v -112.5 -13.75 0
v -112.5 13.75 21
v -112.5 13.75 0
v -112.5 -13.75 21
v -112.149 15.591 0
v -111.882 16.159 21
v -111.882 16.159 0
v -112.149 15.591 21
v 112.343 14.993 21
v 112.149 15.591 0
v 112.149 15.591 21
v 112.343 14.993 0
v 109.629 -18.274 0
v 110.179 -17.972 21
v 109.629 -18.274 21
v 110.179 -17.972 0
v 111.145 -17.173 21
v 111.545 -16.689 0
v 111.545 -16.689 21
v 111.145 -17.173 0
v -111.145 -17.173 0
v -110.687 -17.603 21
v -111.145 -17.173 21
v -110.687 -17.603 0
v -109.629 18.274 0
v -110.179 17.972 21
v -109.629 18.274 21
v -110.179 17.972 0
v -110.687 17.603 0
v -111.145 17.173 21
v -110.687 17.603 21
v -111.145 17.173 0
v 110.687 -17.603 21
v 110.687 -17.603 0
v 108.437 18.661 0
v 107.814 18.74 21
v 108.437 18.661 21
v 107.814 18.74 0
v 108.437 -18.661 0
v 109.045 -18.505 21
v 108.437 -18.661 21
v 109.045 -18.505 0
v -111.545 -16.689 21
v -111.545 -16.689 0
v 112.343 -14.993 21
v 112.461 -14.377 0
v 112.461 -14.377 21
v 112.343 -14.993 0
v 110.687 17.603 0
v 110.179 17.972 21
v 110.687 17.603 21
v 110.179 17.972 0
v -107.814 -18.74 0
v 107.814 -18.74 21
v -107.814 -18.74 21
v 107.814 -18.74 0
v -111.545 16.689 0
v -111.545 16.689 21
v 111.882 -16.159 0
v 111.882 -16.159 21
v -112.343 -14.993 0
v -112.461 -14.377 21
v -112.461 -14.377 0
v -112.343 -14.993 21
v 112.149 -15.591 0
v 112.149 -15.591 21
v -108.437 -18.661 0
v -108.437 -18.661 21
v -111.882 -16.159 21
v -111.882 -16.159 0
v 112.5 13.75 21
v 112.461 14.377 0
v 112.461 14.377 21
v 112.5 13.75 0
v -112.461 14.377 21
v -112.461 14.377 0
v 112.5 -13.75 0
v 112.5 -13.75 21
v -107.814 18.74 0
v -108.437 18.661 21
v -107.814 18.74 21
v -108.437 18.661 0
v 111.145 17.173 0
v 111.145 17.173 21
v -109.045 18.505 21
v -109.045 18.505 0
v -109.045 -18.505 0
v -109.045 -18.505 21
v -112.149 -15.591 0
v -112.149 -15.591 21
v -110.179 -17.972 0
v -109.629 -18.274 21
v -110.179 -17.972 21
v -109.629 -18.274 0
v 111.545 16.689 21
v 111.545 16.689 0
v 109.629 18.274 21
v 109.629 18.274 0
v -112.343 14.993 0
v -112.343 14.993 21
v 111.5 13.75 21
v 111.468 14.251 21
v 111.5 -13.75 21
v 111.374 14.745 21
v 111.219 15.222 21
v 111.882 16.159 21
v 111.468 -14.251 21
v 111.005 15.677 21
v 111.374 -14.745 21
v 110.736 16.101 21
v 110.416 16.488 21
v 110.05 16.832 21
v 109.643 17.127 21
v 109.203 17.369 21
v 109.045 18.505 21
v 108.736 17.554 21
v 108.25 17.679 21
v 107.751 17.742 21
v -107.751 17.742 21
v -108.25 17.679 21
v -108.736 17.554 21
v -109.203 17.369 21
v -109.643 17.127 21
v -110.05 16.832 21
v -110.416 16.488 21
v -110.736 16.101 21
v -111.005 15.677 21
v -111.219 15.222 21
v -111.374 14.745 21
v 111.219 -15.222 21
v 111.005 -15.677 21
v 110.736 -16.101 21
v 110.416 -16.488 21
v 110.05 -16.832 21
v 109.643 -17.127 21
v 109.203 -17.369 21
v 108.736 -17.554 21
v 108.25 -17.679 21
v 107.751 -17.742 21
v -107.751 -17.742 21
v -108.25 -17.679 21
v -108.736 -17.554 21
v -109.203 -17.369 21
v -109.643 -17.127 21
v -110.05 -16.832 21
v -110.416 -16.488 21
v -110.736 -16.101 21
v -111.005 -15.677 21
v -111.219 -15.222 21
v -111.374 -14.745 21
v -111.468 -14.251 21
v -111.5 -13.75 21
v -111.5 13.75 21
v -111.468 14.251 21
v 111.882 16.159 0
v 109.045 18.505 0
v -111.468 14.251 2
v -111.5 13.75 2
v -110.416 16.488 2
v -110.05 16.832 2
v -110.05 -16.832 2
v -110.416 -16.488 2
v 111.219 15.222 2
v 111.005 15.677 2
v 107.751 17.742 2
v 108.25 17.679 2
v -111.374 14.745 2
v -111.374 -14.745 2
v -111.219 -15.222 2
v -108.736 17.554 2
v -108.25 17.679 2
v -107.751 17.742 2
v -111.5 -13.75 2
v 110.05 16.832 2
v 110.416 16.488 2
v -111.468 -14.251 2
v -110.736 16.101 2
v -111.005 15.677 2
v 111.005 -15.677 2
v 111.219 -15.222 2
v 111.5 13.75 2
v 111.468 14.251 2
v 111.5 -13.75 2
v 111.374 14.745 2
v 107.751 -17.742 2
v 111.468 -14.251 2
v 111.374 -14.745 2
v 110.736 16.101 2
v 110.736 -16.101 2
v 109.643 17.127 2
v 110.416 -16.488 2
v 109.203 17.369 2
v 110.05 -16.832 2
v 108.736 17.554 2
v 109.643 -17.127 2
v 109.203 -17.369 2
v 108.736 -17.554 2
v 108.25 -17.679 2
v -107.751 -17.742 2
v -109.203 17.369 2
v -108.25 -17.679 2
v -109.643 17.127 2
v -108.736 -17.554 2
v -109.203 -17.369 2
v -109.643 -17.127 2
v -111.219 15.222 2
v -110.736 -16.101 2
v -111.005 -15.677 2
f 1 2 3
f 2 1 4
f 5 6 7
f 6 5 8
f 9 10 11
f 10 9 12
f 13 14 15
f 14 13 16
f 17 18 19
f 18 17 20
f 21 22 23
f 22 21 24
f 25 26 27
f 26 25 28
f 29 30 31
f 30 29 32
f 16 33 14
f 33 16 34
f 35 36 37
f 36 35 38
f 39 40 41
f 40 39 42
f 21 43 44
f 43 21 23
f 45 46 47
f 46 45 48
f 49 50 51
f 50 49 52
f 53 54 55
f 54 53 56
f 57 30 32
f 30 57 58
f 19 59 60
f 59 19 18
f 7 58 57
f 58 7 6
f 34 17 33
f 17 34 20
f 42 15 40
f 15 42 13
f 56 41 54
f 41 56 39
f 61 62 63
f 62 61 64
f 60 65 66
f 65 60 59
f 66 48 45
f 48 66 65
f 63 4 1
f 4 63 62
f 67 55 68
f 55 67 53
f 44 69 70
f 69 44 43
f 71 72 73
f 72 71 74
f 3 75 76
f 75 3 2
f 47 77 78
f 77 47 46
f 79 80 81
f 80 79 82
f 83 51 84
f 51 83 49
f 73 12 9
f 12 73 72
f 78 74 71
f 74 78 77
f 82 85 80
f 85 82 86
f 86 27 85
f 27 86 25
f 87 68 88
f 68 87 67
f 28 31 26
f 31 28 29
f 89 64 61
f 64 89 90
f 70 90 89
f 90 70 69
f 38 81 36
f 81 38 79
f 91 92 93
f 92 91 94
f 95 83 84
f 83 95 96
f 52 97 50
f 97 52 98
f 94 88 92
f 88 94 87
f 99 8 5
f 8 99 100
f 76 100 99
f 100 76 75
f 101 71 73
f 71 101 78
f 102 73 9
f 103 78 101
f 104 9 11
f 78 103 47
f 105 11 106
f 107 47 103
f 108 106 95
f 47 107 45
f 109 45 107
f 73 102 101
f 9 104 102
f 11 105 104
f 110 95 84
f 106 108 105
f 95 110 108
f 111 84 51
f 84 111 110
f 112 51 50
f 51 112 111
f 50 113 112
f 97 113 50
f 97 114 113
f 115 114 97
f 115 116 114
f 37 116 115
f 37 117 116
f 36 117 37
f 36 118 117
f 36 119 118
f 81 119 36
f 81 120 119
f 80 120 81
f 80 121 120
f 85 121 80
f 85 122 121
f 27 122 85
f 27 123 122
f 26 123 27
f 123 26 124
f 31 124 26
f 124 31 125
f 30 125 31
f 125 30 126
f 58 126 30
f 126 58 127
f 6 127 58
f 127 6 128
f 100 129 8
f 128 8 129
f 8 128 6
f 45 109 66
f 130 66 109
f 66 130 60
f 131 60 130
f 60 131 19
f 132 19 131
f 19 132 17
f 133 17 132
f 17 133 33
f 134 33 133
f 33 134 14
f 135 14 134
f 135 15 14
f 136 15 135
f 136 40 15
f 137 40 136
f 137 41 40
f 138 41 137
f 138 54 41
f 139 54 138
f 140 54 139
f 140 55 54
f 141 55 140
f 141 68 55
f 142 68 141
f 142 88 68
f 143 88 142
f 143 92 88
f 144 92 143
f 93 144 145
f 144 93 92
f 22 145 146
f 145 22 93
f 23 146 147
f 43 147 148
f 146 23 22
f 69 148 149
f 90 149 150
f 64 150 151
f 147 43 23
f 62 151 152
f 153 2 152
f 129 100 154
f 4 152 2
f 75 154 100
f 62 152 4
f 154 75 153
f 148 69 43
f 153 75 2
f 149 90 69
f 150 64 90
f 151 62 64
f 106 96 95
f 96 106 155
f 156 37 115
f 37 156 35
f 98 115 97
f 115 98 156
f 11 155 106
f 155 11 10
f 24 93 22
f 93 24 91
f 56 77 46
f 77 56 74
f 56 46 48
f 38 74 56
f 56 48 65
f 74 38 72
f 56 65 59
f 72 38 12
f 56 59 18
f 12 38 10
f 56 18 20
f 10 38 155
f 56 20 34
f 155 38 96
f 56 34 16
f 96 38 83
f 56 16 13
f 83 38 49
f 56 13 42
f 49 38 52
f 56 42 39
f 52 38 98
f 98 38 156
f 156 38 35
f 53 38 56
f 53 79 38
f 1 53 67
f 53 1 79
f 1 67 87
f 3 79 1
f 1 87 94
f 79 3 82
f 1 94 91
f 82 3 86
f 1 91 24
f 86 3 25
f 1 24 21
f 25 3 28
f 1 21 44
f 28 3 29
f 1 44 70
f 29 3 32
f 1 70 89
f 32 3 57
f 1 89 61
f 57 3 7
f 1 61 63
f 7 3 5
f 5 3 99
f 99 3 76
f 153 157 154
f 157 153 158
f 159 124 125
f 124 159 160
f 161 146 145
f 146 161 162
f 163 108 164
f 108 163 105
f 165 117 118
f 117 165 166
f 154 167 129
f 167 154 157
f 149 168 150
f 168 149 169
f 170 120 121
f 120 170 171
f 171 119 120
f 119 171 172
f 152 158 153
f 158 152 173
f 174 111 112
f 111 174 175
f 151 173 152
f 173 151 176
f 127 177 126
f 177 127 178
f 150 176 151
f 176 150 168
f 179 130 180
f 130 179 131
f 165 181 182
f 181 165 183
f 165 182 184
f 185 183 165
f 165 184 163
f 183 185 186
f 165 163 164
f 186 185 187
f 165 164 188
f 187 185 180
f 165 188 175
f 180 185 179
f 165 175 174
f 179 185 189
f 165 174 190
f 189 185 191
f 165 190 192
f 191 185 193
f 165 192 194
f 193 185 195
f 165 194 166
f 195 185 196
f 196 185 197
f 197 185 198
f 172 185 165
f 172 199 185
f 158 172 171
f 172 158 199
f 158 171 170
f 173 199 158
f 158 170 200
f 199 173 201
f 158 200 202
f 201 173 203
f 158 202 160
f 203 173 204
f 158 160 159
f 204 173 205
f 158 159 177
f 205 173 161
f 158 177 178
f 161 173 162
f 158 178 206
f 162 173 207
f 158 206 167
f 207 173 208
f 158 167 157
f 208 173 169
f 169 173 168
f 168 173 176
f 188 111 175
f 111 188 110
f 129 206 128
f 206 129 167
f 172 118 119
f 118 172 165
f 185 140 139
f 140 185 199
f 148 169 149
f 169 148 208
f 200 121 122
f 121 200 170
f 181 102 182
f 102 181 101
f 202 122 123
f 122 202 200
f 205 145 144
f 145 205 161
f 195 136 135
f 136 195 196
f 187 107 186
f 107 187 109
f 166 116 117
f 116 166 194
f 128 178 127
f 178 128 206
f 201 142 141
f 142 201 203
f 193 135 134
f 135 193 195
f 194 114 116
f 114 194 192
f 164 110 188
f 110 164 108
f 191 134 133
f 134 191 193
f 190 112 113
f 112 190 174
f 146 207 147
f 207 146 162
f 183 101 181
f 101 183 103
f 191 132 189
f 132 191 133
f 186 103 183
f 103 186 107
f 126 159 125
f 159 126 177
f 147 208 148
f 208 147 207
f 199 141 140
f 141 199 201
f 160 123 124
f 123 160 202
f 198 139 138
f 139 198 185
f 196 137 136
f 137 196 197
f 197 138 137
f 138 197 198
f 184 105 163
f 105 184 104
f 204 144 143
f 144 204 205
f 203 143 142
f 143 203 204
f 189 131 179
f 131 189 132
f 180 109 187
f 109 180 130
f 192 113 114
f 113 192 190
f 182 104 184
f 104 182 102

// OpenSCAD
$fn = 50;


difference() {
	union() {
		hull() {
			translate(v = [-107.5000000000, 13.7500000000, 0]) {
				cylinder(h = 21, r = 5);
			}
			translate(v = [107.5000000000, 13.7500000000, 0]) {
				cylinder(h = 21, r = 5);
			}
			translate(v = [-107.5000000000, -13.7500000000, 0]) {
				cylinder(h = 21, r = 5);
			}
			translate(v = [107.5000000000, -13.7500000000, 0]) {
				cylinder(h = 21, r = 5);
			}
		}
	}
	union() {
		translate(v = [0, 0, 2]) {
			hull() {
				translate(v = [-107.5000000000, 13.7500000000, 0]) {
					cylinder(h = 19, r = 4);
				}
				translate(v = [107.5000000000, 13.7500000000, 0]) {
					cylinder(h = 19, r = 4);
				}
				translate(v = [-107.5000000000, -13.7500000000, 0]) {
					cylinder(h = 19, r = 4);
				}
				translate(v = [107.5000000000, -13.7500000000, 0]) {
					cylinder(h = 19, r = 4);
				}
			}
		}
	}
}
